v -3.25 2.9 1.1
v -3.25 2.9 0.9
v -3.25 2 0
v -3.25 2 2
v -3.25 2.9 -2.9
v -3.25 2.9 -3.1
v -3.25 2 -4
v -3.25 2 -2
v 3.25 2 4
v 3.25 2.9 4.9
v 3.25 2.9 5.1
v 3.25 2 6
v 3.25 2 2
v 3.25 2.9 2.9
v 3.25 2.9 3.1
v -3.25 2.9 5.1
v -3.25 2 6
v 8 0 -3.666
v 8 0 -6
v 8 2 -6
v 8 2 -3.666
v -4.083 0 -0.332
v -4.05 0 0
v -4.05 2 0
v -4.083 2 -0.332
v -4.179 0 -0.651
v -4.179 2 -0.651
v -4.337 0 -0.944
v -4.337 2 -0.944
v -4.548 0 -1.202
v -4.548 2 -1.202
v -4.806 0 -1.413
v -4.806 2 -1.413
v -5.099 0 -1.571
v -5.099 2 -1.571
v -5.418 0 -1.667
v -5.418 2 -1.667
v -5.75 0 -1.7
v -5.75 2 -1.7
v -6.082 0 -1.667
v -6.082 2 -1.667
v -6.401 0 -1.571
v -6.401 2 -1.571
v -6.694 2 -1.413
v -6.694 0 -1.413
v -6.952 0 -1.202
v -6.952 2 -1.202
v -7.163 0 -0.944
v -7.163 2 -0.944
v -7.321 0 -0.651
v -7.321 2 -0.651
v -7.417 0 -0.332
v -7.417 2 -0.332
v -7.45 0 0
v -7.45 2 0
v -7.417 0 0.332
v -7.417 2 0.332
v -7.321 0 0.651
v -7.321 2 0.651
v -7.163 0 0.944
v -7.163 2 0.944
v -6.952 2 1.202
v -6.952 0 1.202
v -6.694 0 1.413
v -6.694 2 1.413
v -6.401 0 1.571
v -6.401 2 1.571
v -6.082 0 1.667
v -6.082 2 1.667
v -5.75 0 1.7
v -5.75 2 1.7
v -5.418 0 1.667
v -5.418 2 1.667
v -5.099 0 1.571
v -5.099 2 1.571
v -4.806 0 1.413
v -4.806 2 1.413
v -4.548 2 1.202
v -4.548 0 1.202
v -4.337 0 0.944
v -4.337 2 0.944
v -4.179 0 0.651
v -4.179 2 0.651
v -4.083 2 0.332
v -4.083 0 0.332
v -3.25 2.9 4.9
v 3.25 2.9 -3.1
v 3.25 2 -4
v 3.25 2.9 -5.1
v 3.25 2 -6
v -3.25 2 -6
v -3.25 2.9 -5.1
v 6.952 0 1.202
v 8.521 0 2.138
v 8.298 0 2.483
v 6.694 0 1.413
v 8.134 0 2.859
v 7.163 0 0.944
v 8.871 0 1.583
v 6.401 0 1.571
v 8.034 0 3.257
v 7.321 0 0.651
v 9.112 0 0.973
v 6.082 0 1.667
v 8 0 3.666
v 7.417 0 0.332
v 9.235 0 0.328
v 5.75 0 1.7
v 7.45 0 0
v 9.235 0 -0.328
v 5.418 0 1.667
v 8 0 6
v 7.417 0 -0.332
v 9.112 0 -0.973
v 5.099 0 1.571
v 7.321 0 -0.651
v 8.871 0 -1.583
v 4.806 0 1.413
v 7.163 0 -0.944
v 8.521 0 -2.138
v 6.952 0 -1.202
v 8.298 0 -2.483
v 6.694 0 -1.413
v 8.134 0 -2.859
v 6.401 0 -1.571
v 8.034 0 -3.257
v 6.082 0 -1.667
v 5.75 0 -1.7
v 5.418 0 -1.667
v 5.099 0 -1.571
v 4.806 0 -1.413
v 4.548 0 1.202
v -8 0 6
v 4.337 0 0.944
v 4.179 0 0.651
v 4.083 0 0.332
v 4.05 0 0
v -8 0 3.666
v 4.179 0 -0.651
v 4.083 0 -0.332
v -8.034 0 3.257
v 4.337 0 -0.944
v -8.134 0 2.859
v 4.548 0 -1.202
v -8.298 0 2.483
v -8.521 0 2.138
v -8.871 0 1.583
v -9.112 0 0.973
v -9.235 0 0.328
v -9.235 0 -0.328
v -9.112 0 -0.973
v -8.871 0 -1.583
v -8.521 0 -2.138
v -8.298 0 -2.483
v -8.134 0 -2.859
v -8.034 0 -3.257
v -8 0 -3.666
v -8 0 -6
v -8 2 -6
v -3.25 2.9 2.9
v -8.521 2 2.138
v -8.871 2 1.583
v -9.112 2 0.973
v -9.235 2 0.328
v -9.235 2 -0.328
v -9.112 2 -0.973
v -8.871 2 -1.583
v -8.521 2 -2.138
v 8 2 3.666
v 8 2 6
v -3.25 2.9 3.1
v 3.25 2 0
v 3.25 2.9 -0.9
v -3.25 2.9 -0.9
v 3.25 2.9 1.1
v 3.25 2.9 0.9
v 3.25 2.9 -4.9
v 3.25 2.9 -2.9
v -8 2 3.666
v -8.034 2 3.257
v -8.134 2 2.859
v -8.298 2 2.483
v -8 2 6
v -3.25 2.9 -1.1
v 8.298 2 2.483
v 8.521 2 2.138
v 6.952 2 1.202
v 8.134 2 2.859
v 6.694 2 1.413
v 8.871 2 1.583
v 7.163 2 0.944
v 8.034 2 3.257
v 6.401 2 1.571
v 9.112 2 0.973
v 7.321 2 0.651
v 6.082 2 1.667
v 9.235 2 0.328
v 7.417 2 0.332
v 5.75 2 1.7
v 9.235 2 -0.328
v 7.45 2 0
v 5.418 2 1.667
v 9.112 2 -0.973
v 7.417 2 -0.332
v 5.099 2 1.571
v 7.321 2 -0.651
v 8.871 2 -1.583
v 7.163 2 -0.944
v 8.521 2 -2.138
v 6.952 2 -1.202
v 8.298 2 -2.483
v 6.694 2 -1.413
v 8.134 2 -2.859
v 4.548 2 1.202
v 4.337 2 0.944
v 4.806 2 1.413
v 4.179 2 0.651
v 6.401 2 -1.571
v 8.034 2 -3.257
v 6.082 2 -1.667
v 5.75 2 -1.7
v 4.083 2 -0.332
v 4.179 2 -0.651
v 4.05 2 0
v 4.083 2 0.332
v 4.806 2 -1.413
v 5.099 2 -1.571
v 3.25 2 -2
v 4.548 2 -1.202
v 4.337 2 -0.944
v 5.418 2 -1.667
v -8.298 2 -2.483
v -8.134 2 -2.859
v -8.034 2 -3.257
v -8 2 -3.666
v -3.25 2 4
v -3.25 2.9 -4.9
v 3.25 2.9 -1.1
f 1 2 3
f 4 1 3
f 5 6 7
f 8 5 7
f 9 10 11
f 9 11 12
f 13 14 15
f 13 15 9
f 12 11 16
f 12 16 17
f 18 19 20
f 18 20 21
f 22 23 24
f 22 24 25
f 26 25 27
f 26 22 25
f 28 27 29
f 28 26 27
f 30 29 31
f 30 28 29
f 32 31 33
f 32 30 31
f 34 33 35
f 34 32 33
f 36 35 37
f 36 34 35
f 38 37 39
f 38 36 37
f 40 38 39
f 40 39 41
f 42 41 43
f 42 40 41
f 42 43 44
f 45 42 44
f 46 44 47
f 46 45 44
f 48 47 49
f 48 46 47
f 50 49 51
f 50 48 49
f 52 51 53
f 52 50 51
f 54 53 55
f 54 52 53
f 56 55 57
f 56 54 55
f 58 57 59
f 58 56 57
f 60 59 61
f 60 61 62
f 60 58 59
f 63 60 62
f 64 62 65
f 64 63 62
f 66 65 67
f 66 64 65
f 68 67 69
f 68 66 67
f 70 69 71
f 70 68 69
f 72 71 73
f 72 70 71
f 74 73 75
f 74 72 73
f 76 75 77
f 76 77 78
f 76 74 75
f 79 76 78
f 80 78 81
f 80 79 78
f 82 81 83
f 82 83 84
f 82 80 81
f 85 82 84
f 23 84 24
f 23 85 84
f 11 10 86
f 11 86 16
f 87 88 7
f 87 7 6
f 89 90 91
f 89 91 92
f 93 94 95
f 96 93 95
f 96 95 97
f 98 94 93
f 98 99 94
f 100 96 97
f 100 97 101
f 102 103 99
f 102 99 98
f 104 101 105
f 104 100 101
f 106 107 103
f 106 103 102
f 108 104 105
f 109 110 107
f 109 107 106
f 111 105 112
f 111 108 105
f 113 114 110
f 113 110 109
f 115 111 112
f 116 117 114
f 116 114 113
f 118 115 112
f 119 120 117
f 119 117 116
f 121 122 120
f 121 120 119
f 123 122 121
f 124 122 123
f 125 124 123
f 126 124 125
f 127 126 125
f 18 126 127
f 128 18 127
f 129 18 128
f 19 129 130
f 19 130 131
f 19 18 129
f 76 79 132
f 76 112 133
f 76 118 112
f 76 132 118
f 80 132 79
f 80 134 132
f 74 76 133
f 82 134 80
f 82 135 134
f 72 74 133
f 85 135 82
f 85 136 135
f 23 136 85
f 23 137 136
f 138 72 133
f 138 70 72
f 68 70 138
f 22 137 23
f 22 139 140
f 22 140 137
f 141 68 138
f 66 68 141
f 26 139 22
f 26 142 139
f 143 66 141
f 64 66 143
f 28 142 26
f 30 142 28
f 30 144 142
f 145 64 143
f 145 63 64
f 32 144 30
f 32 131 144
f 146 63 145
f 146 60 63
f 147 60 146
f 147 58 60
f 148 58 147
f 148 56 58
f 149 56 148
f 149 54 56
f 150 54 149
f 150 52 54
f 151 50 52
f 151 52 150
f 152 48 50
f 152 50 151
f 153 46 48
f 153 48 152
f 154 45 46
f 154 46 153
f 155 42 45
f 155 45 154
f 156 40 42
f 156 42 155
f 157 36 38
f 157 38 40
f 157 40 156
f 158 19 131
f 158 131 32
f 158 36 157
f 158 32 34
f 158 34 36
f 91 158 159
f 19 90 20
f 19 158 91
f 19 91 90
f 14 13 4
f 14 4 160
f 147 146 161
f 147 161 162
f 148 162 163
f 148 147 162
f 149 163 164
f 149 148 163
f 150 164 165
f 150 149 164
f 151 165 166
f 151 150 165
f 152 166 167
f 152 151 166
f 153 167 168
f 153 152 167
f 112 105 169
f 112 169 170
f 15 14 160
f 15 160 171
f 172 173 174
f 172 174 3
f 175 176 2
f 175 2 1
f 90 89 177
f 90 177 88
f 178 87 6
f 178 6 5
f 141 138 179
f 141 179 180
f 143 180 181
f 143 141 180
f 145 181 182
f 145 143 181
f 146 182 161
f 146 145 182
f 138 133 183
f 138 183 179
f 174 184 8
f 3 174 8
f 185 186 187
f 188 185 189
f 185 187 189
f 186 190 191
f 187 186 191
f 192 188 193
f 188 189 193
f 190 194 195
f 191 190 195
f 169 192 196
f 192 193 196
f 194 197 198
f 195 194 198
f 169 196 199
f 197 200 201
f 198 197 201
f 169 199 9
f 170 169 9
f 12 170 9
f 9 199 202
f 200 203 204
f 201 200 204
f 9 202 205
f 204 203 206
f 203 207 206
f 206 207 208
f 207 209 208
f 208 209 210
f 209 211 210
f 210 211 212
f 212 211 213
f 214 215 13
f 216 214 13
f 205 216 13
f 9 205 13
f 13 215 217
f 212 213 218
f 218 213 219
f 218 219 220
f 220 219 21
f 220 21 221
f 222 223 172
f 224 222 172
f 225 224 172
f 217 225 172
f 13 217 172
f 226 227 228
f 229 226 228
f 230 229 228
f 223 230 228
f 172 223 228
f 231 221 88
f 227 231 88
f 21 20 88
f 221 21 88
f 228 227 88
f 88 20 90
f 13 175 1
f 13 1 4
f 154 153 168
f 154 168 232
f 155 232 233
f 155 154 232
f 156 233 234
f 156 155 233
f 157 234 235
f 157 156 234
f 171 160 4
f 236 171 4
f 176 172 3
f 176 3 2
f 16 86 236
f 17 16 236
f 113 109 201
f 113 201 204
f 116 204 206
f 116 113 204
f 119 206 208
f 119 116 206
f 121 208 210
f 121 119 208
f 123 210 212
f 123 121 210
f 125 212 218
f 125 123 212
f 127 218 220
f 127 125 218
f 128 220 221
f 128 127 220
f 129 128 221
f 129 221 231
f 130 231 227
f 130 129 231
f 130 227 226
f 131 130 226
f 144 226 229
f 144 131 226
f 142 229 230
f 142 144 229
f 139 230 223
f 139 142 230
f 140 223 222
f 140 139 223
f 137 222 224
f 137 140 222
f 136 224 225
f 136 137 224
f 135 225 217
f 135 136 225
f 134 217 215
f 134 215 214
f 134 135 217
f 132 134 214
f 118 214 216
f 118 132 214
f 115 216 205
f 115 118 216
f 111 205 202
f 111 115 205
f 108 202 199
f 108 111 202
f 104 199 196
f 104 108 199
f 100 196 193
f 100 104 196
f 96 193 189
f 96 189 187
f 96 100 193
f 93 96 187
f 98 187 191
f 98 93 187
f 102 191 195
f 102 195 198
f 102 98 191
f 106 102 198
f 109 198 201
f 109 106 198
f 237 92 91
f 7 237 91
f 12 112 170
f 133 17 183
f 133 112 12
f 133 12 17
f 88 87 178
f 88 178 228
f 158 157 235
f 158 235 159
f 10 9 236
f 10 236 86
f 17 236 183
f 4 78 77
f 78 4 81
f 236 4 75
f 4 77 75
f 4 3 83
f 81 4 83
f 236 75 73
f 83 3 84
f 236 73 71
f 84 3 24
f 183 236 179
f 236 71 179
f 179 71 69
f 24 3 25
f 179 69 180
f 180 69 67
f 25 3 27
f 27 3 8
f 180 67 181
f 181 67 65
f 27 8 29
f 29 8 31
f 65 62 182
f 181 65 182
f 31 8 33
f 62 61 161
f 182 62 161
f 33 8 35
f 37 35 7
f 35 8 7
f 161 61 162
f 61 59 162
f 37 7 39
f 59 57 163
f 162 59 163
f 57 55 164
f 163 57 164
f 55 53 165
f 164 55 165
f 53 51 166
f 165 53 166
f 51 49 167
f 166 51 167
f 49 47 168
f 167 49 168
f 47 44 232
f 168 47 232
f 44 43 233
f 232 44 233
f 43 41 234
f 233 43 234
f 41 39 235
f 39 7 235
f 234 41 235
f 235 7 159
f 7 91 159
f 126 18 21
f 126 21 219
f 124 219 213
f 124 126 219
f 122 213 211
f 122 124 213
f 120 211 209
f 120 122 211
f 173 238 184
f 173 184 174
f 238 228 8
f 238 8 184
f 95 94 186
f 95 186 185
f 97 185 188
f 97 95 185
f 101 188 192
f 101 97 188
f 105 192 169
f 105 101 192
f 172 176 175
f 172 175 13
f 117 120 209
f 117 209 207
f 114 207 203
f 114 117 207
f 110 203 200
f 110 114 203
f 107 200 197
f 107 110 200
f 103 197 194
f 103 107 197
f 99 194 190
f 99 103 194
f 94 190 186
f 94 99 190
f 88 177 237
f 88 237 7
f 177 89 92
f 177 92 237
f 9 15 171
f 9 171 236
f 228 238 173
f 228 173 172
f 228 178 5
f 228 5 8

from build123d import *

# Parameters (mm, degrees)
CROQUIS1_R              = 1.7
SALIENTE_EXTRUIR1_DEPTH = 2
SALIENTE_EXTRUIR2_DEPTH = 6.5
MATRIZL1_COUNT          = 6
MATRIZL1_PITCH          = 2


with BuildPart() as part:
    # Croquis1 → Saliente-Extruir1 (new body)
    with BuildSketch(Plane(origin=(0, 0, 0), x_dir=(1, 0, 0), z_dir=(0, 1, 0))):
        with BuildLine():
            Line((-8, 6), (8, 6))
            Line((8, 6), (8, 3.665719575))
            ThreePointArc((8, 3.665719575), (8.133788189, 2.858848044), (8.520833333, 2.138336419))
            ThreePointArc((8.520833333, 2.138336419), (9.25, 0), (8.520833333, -2.138336419))
            ThreePointArc((8.520833333, -2.138336419), (8.133788189, -2.858848044), (8, -3.665719575))
            Line((8, -3.665719575), (8, -6))
            Line((8, -6), (-8, -6))
            Line((-8, -6), (-8, -3.665719575))
            ThreePointArc((-8, -3.665719575), (-8.133788189, -2.858848044), (-8.520833333, -2.138336419))
            ThreePointArc((-8.520833333, -2.138336419), (-9.25, 0), (-8.520833333, 2.138336419))
            ThreePointArc((-8.520833333, 2.138336419), (-8.133788189, 2.858848044), (-8, 3.665719575))
            Line((-8, 3.665719575), (-8, 6))
        make_face()
        with Locations((5.75, 0)):
            Circle(CROQUIS1_R, mode=Mode.SUBTRACT)
        with Locations((-5.75, 0)):
            Circle(CROQUIS1_R, mode=Mode.SUBTRACT)
    extrude(amount=SALIENTE_EXTRUIR1_DEPTH)

    # Croquis4 → Saliente-Extruir2 (add)
    with BuildSketch(Plane(origin=(3.25, 0, 0), x_dir=(0, 0, -1), z_dir=(1, 0, 0))):
        Polygon((-6, 2), (-4, 2), (-4.9, 2.9), (-5.1, 2.9), align=None)
    saliente_extruir2 = extrude(amount=-SALIENTE_EXTRUIR2_DEPTH)

    # MatrizL1: Saliente-Extruir2 ×6
    with Locations(*[(0, 0, -i * MATRIZL1_PITCH) for i in range(1, MATRIZL1_COUNT)]):
        add(saliente_extruir2)


solid = part.part
